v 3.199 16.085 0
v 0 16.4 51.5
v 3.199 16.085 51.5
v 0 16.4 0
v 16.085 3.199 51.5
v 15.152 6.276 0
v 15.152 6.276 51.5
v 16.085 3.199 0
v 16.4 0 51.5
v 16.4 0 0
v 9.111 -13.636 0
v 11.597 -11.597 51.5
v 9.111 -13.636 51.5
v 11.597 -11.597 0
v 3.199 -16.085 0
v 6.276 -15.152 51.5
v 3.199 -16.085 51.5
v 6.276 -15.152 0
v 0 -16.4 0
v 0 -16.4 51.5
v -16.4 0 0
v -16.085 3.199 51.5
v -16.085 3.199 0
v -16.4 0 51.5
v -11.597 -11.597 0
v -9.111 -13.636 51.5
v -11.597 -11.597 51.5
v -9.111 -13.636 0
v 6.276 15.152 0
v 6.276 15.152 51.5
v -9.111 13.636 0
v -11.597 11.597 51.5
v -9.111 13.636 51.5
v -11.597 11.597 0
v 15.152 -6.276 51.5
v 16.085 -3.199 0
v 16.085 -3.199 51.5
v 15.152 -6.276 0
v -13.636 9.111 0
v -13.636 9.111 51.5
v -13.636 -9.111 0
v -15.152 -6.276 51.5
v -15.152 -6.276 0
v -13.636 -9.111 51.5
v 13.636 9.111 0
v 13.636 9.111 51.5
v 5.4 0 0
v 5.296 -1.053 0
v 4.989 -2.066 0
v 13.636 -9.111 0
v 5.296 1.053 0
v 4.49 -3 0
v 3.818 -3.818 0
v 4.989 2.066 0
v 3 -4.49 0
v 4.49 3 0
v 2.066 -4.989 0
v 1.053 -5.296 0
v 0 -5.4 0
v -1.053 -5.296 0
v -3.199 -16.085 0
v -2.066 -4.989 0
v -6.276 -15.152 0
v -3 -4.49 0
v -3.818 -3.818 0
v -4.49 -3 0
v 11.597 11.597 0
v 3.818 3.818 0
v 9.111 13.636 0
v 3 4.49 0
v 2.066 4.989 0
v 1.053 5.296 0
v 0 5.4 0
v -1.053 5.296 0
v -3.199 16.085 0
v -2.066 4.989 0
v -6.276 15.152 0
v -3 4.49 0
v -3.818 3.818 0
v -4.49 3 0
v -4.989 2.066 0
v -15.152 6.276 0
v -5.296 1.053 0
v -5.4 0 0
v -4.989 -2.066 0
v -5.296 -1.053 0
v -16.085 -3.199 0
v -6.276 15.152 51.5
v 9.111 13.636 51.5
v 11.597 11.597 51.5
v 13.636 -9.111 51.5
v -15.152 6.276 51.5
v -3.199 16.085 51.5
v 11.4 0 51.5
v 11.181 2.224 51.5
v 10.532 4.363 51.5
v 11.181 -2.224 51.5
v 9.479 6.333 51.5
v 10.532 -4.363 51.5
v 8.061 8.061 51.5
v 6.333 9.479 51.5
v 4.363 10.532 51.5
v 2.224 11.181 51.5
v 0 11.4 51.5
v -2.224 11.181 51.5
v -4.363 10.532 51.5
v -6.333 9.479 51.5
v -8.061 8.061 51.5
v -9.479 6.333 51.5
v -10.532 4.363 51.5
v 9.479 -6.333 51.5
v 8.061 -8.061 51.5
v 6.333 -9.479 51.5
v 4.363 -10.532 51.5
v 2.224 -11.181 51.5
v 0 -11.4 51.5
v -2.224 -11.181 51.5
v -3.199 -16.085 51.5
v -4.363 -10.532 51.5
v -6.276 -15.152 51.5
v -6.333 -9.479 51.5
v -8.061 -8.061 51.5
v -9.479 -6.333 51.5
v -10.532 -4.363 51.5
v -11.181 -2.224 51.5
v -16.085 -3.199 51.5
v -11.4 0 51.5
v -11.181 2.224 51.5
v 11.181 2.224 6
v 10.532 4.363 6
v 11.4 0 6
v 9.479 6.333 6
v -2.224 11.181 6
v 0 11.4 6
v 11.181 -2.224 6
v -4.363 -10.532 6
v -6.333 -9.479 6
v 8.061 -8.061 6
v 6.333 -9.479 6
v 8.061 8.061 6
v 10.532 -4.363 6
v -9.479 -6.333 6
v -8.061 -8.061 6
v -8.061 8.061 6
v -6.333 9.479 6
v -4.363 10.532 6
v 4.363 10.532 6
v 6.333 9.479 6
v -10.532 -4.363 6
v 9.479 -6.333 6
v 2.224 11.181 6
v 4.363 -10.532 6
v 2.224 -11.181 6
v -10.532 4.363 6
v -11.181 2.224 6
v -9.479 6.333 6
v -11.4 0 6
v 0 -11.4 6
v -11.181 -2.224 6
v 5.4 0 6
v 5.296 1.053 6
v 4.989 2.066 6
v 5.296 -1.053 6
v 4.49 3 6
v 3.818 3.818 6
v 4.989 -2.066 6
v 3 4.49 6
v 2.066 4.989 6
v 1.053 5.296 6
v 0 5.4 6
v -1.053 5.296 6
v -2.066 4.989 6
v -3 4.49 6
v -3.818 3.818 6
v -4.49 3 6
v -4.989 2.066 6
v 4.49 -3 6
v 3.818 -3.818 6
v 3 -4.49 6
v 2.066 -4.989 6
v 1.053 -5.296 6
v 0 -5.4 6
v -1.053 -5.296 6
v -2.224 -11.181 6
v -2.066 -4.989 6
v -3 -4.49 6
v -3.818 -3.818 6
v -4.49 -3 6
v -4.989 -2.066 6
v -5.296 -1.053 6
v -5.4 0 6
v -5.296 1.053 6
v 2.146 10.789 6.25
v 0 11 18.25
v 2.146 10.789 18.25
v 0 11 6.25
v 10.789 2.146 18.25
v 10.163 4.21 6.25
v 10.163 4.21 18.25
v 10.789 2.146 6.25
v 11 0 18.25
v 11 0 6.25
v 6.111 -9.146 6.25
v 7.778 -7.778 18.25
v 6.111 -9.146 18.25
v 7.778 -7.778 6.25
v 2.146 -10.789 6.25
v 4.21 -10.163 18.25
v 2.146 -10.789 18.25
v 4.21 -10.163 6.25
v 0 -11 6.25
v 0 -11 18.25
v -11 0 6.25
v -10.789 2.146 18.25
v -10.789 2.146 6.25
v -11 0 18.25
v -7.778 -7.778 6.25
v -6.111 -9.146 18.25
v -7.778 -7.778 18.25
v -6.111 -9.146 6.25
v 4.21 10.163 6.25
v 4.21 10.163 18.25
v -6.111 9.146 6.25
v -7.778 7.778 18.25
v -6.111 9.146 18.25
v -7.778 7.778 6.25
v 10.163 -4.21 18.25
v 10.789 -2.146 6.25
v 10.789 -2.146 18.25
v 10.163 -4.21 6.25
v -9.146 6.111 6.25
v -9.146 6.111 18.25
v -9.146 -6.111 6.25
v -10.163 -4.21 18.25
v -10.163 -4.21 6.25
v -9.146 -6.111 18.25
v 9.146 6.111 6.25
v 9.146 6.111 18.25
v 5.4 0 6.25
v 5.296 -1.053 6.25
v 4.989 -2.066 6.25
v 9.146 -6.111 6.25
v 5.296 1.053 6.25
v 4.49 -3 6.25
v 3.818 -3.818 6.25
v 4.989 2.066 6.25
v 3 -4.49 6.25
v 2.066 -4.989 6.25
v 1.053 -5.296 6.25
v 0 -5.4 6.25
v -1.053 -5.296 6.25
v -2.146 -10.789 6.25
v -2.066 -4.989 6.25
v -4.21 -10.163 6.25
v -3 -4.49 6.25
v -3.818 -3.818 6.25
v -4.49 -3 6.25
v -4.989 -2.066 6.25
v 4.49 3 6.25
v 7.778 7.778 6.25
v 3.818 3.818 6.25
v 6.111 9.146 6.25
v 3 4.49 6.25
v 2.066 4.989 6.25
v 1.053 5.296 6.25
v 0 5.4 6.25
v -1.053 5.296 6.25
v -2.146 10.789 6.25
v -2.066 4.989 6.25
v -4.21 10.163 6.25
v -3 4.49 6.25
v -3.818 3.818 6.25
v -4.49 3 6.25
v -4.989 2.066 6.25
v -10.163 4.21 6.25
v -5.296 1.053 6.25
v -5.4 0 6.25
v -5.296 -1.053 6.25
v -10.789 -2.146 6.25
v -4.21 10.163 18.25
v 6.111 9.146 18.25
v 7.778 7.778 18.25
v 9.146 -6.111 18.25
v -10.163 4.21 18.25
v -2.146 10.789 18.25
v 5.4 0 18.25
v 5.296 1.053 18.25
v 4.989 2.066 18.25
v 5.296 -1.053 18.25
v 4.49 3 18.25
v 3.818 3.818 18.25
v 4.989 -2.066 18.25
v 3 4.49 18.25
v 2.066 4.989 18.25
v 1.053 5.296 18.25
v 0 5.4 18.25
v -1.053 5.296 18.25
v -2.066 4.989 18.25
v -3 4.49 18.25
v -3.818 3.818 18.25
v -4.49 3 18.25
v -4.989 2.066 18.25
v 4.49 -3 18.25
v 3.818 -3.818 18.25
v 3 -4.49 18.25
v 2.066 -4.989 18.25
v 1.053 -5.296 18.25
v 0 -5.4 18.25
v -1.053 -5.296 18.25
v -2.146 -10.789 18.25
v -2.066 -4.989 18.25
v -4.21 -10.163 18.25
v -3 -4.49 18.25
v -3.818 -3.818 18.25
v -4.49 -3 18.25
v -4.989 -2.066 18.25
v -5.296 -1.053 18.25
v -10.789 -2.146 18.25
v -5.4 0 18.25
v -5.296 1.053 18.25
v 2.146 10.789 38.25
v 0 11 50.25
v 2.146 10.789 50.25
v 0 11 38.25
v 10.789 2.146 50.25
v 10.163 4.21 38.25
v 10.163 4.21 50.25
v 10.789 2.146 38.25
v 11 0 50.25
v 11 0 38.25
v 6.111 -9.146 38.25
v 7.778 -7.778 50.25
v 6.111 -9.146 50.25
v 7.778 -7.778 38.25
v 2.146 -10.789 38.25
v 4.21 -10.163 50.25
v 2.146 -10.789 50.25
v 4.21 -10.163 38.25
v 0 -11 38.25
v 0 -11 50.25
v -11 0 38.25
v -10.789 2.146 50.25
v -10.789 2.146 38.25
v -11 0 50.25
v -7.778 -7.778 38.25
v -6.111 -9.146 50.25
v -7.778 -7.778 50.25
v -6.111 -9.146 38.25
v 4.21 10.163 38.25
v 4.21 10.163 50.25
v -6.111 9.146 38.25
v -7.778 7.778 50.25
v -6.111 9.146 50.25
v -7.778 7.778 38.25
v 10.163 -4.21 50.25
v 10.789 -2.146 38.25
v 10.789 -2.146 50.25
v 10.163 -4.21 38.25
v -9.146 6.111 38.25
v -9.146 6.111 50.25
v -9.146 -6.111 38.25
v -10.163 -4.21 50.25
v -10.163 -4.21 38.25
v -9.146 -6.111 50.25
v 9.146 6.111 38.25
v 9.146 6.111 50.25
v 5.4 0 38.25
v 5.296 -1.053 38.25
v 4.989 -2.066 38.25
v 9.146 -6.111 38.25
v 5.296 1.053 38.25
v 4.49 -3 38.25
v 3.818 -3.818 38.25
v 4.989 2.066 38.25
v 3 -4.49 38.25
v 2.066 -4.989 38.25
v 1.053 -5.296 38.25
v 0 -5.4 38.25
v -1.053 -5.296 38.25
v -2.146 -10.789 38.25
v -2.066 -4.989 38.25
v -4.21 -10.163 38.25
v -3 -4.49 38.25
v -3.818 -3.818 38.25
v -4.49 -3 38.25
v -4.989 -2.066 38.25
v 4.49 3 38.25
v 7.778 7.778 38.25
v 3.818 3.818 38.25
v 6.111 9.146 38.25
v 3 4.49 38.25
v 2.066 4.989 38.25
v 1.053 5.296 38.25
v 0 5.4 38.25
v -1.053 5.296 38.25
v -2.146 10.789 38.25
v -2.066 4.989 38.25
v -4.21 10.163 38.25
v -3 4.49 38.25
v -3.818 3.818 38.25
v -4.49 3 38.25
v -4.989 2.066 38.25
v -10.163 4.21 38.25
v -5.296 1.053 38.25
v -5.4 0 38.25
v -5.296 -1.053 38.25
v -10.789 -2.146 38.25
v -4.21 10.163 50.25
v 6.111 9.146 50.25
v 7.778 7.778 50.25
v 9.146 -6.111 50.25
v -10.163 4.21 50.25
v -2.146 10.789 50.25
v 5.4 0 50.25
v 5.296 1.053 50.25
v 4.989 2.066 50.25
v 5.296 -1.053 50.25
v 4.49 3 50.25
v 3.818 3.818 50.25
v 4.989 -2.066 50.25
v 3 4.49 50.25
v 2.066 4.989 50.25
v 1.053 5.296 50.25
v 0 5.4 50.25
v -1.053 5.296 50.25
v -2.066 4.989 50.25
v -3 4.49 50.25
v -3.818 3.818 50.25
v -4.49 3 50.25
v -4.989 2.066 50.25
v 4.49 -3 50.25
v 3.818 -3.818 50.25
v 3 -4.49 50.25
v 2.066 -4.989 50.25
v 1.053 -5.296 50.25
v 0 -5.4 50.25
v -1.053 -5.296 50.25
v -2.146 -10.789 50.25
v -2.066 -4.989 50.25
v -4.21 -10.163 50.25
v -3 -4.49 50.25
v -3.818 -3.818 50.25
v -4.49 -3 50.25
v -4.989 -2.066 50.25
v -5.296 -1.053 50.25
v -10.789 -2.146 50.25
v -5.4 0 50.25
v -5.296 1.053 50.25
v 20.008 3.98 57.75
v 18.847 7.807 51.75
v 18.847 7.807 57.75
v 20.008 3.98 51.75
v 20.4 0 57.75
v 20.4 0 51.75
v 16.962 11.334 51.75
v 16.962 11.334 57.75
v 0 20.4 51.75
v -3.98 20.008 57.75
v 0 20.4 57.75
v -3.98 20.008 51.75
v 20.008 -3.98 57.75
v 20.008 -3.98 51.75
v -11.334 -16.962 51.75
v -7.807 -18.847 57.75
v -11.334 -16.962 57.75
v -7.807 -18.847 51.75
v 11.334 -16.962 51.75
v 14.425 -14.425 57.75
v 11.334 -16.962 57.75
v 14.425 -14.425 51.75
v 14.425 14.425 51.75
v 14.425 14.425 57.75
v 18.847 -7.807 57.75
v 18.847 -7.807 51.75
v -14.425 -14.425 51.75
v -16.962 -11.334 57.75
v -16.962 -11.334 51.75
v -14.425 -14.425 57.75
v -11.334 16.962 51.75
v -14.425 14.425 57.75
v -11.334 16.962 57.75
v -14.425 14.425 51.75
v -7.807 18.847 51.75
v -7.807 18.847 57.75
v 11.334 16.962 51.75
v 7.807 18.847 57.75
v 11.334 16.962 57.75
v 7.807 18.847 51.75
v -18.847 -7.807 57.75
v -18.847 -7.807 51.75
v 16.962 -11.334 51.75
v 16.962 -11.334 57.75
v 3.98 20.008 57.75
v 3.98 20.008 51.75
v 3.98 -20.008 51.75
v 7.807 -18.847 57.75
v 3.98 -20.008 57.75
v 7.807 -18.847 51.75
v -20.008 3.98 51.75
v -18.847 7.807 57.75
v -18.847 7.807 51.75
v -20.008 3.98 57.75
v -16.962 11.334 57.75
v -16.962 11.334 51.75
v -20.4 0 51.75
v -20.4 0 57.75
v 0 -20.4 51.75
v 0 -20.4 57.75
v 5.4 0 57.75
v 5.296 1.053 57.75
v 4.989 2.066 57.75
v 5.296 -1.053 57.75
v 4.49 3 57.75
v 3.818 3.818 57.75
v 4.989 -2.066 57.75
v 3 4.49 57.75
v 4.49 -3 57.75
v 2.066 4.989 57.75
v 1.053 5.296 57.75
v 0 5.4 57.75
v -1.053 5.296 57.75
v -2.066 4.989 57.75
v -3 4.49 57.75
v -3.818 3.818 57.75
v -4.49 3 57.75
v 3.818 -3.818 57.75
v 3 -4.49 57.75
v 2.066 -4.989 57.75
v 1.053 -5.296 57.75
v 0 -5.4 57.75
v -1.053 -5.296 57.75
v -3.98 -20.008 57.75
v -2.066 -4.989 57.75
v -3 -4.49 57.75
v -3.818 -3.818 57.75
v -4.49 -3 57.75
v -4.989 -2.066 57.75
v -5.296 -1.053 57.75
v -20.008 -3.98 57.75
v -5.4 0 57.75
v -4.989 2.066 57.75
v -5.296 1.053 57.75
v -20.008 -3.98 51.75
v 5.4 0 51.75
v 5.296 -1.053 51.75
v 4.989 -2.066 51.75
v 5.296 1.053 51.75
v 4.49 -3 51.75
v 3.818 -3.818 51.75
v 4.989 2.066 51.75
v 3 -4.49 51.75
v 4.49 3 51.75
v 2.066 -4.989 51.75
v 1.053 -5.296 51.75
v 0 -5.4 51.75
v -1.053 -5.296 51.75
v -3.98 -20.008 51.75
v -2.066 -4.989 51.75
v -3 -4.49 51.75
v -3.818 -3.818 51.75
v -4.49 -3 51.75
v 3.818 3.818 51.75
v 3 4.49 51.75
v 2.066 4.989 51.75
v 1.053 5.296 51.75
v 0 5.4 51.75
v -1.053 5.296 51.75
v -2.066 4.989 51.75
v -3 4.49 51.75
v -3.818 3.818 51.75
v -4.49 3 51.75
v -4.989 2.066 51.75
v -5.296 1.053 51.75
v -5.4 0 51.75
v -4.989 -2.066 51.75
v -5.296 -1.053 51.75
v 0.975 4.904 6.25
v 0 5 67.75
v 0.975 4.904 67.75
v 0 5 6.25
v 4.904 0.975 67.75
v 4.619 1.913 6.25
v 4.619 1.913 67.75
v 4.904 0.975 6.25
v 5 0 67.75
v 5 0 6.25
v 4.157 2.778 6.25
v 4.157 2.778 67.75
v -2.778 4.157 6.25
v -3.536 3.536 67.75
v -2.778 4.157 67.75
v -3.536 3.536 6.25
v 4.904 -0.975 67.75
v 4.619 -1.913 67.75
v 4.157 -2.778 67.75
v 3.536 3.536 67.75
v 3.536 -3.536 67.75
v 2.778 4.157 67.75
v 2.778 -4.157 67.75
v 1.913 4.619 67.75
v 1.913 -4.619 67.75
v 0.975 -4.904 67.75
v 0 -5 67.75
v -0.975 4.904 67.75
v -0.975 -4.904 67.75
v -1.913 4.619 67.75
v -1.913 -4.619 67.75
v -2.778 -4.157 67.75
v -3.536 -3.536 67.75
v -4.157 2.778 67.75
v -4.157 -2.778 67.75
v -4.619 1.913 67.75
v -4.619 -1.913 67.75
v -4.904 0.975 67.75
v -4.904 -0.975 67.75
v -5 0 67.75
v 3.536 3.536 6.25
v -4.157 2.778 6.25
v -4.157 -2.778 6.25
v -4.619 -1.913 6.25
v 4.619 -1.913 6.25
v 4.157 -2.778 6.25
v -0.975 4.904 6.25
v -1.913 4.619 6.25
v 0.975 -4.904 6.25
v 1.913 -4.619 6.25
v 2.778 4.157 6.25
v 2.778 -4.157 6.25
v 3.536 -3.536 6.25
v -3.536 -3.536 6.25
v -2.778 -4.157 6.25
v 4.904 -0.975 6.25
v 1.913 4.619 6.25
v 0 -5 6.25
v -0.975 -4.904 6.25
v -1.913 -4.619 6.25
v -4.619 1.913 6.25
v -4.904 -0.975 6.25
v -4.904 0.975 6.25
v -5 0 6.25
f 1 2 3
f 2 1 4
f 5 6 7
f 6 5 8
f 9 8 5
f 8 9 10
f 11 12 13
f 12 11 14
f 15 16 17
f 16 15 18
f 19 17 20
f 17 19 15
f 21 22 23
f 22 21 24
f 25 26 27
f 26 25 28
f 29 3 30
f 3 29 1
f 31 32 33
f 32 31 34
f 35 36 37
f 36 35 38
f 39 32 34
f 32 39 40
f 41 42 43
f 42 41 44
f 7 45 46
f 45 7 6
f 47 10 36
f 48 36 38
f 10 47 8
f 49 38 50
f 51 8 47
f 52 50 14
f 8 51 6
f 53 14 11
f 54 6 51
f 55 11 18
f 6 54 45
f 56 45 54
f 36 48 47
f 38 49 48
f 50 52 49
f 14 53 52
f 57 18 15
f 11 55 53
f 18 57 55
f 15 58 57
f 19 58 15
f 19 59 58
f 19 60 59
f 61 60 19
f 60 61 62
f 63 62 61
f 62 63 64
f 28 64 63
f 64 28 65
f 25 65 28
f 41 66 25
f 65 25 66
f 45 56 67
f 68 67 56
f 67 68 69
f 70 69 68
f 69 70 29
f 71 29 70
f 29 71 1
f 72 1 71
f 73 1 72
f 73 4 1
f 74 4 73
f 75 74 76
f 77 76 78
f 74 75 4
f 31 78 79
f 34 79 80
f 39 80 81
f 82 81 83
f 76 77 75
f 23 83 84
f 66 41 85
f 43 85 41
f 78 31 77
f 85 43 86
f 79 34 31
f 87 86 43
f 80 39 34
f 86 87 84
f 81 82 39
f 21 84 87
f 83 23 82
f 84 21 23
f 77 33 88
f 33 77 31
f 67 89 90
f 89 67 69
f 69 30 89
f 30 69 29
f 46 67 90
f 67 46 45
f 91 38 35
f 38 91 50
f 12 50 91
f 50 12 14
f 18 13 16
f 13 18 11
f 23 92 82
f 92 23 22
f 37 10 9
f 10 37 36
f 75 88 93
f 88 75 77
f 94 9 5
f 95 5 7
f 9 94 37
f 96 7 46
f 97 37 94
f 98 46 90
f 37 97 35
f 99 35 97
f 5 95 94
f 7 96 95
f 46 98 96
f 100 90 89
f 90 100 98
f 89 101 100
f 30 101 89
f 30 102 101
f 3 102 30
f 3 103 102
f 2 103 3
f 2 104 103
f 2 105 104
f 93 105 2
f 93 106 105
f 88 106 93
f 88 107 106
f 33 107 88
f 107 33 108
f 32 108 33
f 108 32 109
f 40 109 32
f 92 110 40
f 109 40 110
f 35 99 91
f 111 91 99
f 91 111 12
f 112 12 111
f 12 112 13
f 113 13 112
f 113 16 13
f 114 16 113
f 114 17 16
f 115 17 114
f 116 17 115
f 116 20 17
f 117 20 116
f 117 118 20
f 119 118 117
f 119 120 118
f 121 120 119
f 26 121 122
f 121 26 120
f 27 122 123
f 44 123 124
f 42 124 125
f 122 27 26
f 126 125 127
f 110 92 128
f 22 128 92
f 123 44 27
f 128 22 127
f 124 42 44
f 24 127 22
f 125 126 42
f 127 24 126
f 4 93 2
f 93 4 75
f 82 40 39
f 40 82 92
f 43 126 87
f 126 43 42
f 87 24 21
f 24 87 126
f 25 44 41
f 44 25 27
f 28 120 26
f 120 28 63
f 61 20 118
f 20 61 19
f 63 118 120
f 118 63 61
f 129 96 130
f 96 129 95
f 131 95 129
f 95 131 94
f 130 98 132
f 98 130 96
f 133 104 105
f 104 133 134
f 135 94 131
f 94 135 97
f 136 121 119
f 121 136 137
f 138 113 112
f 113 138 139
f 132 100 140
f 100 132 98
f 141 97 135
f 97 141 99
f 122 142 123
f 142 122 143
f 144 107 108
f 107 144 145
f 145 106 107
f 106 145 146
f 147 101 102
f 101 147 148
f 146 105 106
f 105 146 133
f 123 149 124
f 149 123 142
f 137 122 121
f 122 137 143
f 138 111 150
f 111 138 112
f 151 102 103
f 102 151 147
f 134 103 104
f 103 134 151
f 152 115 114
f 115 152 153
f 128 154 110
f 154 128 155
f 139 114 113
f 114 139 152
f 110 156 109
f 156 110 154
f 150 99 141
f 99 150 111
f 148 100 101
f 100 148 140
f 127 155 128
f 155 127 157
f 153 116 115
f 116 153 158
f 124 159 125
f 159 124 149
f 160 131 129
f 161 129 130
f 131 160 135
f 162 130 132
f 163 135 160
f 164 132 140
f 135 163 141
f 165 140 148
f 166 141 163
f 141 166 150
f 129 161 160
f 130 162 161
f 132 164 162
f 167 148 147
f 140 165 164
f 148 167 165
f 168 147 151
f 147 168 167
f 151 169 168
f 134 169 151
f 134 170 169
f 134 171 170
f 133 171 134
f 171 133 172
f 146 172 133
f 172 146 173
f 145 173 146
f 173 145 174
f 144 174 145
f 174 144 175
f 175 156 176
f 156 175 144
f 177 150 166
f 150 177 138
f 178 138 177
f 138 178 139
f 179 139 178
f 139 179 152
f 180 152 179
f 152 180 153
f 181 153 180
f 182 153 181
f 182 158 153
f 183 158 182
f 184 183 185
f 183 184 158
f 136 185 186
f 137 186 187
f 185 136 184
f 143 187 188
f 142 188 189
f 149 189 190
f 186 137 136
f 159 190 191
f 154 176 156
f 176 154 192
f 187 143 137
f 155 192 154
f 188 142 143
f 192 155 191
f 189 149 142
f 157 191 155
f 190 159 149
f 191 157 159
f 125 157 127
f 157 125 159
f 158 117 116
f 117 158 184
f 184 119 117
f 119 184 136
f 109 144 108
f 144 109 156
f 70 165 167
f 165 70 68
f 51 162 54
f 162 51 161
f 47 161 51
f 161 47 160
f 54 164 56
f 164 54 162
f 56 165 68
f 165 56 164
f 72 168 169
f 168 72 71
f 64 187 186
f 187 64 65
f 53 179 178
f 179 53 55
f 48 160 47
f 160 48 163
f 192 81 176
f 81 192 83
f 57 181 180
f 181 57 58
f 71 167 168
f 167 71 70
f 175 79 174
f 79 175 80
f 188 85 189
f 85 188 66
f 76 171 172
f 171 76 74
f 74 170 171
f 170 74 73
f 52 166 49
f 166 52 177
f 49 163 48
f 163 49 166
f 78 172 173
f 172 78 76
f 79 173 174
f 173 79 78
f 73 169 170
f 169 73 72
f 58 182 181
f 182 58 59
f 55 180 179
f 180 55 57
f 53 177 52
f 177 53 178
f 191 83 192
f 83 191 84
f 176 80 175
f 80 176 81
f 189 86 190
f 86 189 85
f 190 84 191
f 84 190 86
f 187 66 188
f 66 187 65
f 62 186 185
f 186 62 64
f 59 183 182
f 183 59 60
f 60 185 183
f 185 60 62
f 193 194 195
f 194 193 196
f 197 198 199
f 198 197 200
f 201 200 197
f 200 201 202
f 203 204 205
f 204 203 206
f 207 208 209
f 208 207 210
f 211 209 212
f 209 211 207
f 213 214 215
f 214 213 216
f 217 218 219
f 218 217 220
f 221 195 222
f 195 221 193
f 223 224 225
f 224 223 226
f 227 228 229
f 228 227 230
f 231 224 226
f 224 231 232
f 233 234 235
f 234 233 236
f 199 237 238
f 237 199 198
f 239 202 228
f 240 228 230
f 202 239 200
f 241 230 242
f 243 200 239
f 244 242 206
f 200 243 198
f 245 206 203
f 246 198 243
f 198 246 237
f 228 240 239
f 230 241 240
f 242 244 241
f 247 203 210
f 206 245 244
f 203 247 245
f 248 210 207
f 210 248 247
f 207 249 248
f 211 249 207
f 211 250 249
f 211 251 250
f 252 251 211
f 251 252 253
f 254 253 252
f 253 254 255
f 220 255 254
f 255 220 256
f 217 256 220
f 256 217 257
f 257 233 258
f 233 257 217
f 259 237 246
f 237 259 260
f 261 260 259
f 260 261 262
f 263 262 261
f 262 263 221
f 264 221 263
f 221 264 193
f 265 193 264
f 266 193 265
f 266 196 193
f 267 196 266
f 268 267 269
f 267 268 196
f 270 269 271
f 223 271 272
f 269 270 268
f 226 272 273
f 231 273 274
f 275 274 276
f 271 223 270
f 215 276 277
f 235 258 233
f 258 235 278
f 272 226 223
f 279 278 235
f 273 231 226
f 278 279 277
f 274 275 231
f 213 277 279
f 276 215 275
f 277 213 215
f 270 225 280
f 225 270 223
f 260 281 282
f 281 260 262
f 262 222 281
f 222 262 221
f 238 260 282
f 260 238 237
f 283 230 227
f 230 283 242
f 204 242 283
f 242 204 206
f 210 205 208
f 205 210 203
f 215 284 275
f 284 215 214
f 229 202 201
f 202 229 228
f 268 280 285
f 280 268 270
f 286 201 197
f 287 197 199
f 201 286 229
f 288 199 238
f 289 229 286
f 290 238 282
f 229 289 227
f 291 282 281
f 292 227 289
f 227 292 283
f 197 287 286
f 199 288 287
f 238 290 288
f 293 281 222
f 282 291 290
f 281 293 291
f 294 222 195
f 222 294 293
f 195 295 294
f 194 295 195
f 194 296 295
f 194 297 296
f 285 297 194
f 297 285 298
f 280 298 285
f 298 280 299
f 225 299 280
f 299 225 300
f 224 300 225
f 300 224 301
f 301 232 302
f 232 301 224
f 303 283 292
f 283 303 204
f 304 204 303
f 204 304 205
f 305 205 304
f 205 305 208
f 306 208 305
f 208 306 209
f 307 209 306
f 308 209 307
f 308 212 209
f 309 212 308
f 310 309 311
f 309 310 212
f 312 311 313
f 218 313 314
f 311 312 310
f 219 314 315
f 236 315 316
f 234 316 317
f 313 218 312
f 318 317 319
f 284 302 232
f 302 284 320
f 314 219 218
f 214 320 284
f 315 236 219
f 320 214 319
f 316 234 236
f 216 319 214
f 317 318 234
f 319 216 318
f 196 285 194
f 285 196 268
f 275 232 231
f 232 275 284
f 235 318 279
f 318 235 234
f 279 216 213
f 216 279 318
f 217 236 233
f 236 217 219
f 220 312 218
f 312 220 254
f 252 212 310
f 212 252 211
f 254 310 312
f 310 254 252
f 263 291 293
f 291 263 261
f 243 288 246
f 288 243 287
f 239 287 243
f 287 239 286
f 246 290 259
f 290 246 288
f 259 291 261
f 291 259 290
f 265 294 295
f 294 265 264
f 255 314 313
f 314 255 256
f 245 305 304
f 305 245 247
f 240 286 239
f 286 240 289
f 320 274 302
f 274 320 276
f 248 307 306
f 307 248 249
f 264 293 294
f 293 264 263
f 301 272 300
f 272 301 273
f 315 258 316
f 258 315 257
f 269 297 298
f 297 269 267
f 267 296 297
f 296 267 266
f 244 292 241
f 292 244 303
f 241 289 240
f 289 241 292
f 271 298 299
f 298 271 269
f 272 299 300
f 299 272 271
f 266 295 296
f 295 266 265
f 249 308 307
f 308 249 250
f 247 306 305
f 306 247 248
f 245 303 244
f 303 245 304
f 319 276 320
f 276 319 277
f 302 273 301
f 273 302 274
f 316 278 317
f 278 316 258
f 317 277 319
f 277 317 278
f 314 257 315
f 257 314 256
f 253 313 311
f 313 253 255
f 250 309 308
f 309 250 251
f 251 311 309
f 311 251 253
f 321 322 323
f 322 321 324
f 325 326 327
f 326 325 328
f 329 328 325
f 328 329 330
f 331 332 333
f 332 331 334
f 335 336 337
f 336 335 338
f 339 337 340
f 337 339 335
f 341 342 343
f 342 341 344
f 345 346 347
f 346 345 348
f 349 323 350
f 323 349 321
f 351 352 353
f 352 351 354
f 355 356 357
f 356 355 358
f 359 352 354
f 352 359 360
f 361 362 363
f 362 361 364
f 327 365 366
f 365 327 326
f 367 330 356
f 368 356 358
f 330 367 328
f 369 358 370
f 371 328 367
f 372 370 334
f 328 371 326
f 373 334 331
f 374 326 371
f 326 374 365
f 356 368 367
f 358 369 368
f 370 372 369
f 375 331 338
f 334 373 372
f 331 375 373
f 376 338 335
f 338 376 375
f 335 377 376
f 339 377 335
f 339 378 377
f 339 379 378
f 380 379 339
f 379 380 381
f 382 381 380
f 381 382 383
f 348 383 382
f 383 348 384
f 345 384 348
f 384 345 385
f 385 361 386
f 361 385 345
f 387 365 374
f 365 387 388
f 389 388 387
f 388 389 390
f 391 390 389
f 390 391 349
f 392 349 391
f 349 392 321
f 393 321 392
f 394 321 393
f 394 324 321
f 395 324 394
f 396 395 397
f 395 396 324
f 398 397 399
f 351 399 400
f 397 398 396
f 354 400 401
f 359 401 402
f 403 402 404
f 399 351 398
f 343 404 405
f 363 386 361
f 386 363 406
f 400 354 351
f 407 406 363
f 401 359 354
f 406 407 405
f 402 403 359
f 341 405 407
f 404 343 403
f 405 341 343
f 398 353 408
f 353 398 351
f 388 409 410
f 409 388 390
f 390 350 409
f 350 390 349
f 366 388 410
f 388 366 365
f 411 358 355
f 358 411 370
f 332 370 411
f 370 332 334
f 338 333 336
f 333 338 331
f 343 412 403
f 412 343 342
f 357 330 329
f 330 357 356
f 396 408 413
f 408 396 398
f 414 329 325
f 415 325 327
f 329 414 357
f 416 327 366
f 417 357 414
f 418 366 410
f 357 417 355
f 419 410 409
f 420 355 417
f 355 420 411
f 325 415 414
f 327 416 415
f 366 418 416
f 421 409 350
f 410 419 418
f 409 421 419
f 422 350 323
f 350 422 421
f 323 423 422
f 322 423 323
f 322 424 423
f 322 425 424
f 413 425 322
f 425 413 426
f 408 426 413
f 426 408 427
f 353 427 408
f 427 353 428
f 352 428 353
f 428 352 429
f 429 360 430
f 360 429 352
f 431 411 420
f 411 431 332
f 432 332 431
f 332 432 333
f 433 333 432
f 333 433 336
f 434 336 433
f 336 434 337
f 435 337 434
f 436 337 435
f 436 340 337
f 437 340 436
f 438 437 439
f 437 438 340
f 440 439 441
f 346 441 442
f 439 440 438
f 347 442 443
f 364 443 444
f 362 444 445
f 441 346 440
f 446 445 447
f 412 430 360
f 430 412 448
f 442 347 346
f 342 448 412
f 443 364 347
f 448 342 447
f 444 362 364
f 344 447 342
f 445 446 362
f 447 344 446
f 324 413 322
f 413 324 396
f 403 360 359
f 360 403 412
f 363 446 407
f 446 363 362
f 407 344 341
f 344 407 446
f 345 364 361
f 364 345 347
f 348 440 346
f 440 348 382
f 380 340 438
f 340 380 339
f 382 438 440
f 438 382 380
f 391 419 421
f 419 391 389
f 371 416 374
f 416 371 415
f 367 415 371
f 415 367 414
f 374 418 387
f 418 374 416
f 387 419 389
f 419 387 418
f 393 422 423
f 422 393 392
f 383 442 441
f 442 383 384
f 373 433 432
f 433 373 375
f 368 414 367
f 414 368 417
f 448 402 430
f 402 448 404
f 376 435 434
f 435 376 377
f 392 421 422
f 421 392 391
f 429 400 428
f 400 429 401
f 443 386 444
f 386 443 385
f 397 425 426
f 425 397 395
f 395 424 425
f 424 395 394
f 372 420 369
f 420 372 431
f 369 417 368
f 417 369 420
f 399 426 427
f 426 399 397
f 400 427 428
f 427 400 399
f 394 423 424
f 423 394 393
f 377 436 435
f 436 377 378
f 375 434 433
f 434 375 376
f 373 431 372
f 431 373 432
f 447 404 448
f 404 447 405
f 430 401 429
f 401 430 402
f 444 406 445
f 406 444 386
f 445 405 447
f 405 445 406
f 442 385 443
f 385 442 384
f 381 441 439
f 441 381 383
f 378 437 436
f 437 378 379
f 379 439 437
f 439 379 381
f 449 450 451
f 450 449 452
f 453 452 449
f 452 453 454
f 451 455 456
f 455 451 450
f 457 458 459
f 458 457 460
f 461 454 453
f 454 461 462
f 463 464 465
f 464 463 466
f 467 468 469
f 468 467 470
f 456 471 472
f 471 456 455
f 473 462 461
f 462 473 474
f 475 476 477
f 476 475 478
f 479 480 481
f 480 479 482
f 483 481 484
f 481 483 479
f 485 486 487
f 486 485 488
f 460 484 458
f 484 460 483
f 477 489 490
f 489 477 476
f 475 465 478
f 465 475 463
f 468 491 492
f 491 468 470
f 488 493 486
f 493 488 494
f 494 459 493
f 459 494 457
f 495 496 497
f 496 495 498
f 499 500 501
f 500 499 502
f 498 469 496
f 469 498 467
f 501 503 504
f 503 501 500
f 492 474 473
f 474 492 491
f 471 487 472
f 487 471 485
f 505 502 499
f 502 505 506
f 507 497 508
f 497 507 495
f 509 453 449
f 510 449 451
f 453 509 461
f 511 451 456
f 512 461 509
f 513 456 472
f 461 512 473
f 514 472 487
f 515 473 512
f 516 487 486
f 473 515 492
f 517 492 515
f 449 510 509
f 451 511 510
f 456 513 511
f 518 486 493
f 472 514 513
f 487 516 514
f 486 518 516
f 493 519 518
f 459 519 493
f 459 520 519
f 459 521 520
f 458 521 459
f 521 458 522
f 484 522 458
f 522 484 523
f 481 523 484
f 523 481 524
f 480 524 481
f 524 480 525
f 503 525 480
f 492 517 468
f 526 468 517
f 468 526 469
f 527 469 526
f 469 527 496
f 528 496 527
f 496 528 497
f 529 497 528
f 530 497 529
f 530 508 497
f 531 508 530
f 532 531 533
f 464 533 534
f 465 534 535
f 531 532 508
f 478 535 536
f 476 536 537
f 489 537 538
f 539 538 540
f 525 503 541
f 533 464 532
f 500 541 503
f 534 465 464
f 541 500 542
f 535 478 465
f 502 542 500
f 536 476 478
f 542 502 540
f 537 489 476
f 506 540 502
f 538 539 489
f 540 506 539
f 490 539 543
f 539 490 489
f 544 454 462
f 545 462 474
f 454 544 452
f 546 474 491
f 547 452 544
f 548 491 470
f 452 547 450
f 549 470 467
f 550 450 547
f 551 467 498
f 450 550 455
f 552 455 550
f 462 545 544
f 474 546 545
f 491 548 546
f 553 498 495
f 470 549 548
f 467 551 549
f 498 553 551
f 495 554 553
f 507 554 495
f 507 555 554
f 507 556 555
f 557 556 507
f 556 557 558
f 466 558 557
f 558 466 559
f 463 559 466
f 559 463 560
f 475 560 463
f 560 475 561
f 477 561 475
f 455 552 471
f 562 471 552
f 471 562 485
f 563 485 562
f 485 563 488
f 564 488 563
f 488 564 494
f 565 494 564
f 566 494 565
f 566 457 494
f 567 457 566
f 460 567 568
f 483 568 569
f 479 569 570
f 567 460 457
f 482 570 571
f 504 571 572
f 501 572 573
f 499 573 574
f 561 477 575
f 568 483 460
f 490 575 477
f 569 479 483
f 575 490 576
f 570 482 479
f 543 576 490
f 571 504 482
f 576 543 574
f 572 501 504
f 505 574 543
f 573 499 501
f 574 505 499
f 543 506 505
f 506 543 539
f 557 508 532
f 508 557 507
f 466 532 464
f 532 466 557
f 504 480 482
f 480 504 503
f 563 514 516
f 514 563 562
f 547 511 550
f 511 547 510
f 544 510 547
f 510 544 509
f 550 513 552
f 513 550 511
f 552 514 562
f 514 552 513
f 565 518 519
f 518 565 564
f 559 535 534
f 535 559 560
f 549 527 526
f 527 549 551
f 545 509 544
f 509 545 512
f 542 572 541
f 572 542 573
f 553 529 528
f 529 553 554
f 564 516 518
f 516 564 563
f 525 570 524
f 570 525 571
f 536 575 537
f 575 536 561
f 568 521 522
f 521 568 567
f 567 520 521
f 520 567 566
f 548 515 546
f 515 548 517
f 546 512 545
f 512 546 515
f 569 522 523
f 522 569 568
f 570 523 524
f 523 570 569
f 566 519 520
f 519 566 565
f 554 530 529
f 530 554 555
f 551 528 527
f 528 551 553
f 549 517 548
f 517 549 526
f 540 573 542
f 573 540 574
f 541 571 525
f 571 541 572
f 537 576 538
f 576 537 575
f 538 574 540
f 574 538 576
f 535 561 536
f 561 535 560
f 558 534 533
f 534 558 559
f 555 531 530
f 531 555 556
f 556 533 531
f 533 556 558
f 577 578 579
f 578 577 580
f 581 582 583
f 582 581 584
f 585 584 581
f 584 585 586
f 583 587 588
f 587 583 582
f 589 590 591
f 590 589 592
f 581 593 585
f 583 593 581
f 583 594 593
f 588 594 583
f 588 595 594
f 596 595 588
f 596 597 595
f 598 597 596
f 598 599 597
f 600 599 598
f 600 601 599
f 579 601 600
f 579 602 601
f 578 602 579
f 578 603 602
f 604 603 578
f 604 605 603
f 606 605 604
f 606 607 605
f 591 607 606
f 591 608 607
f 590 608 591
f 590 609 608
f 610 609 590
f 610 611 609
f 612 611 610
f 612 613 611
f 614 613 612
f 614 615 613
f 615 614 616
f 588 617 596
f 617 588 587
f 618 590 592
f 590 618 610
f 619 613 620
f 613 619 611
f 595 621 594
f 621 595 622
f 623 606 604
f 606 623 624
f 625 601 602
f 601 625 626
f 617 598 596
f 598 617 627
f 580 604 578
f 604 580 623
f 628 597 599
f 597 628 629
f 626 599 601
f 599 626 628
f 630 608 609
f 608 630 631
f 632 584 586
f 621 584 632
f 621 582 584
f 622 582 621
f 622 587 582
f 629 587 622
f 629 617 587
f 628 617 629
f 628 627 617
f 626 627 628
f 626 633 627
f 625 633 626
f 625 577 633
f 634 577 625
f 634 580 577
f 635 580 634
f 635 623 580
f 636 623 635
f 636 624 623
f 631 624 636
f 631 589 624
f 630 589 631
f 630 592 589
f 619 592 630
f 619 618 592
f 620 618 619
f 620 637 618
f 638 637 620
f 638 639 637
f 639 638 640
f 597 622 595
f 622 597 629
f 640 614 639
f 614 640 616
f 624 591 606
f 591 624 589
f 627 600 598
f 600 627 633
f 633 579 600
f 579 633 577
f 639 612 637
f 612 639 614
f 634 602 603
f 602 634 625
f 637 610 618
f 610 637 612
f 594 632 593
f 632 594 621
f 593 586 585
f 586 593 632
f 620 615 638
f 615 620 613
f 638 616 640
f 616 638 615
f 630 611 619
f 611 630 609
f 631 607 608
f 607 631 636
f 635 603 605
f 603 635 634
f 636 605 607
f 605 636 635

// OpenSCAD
$fn = 32;

// ------------------------------------------------------------------------
// Shaft station: cup d32.8 x 51.5 mm, shaft d10
// Every part is its own module, assembly() places every instance.
// ------------------------------------------------------------------------

// --- part 1 ---
module housing_cup() {
  difference() {
    cylinder(h = 51.5, d = 32.8);
    translate([0, 0, 6]) cylinder(h = 46.5, d = 22.8);
    translate([0, 0, -1]) cylinder(h = 8, d = 10.8);
  }
}

// --- part 2 ---
module bearing_lower() {
  difference() {
      translate([0, 0, 0]) cylinder(h = 12, d = 22);
      translate([0, 0, -1]) cylinder(h = 14, d = 10.8);
    }
}

// --- part 3 ---
module bearing_upper() {
  difference() {
      translate([0, 0, 0]) cylinder(h = 12, d = 22);
      translate([0, 0, -1]) cylinder(h = 14, d = 10.8);
    }
}

// --- part 4 ---
module station_shaft() {
  translate([0, 0, -30.75]) cylinder(h = 61.5, d = 10);
}

// --- part 5 ---
module station_cover() {
  difference() {
    cylinder(h = 6, d = 40.8);
    translate([0, 0, -1]) cylinder(h = 8, d = 10.8);
  }
}

// --- assembly ---
module assembly() {
  color([0.80, 0.24, 0.20]) translate([0, 0, 0]) rotate([0, 0, 0]) housing_cup();
  color([0.20, 0.45, 0.75]) translate([0, 0, 6.25]) rotate([0, 0, 0]) bearing_lower();
  color([0.25, 0.62, 0.32]) translate([0, 0, 38.25]) rotate([0, 0, 0]) bearing_upper();
  color([0.92, 0.70, 0.18]) translate([0, 0, 37]) rotate([0, 0, 0]) station_shaft();
  color([0.58, 0.35, 0.70]) translate([0, 0, 51.75]) rotate([0, 0, 0]) station_cover();
}

assembly();
